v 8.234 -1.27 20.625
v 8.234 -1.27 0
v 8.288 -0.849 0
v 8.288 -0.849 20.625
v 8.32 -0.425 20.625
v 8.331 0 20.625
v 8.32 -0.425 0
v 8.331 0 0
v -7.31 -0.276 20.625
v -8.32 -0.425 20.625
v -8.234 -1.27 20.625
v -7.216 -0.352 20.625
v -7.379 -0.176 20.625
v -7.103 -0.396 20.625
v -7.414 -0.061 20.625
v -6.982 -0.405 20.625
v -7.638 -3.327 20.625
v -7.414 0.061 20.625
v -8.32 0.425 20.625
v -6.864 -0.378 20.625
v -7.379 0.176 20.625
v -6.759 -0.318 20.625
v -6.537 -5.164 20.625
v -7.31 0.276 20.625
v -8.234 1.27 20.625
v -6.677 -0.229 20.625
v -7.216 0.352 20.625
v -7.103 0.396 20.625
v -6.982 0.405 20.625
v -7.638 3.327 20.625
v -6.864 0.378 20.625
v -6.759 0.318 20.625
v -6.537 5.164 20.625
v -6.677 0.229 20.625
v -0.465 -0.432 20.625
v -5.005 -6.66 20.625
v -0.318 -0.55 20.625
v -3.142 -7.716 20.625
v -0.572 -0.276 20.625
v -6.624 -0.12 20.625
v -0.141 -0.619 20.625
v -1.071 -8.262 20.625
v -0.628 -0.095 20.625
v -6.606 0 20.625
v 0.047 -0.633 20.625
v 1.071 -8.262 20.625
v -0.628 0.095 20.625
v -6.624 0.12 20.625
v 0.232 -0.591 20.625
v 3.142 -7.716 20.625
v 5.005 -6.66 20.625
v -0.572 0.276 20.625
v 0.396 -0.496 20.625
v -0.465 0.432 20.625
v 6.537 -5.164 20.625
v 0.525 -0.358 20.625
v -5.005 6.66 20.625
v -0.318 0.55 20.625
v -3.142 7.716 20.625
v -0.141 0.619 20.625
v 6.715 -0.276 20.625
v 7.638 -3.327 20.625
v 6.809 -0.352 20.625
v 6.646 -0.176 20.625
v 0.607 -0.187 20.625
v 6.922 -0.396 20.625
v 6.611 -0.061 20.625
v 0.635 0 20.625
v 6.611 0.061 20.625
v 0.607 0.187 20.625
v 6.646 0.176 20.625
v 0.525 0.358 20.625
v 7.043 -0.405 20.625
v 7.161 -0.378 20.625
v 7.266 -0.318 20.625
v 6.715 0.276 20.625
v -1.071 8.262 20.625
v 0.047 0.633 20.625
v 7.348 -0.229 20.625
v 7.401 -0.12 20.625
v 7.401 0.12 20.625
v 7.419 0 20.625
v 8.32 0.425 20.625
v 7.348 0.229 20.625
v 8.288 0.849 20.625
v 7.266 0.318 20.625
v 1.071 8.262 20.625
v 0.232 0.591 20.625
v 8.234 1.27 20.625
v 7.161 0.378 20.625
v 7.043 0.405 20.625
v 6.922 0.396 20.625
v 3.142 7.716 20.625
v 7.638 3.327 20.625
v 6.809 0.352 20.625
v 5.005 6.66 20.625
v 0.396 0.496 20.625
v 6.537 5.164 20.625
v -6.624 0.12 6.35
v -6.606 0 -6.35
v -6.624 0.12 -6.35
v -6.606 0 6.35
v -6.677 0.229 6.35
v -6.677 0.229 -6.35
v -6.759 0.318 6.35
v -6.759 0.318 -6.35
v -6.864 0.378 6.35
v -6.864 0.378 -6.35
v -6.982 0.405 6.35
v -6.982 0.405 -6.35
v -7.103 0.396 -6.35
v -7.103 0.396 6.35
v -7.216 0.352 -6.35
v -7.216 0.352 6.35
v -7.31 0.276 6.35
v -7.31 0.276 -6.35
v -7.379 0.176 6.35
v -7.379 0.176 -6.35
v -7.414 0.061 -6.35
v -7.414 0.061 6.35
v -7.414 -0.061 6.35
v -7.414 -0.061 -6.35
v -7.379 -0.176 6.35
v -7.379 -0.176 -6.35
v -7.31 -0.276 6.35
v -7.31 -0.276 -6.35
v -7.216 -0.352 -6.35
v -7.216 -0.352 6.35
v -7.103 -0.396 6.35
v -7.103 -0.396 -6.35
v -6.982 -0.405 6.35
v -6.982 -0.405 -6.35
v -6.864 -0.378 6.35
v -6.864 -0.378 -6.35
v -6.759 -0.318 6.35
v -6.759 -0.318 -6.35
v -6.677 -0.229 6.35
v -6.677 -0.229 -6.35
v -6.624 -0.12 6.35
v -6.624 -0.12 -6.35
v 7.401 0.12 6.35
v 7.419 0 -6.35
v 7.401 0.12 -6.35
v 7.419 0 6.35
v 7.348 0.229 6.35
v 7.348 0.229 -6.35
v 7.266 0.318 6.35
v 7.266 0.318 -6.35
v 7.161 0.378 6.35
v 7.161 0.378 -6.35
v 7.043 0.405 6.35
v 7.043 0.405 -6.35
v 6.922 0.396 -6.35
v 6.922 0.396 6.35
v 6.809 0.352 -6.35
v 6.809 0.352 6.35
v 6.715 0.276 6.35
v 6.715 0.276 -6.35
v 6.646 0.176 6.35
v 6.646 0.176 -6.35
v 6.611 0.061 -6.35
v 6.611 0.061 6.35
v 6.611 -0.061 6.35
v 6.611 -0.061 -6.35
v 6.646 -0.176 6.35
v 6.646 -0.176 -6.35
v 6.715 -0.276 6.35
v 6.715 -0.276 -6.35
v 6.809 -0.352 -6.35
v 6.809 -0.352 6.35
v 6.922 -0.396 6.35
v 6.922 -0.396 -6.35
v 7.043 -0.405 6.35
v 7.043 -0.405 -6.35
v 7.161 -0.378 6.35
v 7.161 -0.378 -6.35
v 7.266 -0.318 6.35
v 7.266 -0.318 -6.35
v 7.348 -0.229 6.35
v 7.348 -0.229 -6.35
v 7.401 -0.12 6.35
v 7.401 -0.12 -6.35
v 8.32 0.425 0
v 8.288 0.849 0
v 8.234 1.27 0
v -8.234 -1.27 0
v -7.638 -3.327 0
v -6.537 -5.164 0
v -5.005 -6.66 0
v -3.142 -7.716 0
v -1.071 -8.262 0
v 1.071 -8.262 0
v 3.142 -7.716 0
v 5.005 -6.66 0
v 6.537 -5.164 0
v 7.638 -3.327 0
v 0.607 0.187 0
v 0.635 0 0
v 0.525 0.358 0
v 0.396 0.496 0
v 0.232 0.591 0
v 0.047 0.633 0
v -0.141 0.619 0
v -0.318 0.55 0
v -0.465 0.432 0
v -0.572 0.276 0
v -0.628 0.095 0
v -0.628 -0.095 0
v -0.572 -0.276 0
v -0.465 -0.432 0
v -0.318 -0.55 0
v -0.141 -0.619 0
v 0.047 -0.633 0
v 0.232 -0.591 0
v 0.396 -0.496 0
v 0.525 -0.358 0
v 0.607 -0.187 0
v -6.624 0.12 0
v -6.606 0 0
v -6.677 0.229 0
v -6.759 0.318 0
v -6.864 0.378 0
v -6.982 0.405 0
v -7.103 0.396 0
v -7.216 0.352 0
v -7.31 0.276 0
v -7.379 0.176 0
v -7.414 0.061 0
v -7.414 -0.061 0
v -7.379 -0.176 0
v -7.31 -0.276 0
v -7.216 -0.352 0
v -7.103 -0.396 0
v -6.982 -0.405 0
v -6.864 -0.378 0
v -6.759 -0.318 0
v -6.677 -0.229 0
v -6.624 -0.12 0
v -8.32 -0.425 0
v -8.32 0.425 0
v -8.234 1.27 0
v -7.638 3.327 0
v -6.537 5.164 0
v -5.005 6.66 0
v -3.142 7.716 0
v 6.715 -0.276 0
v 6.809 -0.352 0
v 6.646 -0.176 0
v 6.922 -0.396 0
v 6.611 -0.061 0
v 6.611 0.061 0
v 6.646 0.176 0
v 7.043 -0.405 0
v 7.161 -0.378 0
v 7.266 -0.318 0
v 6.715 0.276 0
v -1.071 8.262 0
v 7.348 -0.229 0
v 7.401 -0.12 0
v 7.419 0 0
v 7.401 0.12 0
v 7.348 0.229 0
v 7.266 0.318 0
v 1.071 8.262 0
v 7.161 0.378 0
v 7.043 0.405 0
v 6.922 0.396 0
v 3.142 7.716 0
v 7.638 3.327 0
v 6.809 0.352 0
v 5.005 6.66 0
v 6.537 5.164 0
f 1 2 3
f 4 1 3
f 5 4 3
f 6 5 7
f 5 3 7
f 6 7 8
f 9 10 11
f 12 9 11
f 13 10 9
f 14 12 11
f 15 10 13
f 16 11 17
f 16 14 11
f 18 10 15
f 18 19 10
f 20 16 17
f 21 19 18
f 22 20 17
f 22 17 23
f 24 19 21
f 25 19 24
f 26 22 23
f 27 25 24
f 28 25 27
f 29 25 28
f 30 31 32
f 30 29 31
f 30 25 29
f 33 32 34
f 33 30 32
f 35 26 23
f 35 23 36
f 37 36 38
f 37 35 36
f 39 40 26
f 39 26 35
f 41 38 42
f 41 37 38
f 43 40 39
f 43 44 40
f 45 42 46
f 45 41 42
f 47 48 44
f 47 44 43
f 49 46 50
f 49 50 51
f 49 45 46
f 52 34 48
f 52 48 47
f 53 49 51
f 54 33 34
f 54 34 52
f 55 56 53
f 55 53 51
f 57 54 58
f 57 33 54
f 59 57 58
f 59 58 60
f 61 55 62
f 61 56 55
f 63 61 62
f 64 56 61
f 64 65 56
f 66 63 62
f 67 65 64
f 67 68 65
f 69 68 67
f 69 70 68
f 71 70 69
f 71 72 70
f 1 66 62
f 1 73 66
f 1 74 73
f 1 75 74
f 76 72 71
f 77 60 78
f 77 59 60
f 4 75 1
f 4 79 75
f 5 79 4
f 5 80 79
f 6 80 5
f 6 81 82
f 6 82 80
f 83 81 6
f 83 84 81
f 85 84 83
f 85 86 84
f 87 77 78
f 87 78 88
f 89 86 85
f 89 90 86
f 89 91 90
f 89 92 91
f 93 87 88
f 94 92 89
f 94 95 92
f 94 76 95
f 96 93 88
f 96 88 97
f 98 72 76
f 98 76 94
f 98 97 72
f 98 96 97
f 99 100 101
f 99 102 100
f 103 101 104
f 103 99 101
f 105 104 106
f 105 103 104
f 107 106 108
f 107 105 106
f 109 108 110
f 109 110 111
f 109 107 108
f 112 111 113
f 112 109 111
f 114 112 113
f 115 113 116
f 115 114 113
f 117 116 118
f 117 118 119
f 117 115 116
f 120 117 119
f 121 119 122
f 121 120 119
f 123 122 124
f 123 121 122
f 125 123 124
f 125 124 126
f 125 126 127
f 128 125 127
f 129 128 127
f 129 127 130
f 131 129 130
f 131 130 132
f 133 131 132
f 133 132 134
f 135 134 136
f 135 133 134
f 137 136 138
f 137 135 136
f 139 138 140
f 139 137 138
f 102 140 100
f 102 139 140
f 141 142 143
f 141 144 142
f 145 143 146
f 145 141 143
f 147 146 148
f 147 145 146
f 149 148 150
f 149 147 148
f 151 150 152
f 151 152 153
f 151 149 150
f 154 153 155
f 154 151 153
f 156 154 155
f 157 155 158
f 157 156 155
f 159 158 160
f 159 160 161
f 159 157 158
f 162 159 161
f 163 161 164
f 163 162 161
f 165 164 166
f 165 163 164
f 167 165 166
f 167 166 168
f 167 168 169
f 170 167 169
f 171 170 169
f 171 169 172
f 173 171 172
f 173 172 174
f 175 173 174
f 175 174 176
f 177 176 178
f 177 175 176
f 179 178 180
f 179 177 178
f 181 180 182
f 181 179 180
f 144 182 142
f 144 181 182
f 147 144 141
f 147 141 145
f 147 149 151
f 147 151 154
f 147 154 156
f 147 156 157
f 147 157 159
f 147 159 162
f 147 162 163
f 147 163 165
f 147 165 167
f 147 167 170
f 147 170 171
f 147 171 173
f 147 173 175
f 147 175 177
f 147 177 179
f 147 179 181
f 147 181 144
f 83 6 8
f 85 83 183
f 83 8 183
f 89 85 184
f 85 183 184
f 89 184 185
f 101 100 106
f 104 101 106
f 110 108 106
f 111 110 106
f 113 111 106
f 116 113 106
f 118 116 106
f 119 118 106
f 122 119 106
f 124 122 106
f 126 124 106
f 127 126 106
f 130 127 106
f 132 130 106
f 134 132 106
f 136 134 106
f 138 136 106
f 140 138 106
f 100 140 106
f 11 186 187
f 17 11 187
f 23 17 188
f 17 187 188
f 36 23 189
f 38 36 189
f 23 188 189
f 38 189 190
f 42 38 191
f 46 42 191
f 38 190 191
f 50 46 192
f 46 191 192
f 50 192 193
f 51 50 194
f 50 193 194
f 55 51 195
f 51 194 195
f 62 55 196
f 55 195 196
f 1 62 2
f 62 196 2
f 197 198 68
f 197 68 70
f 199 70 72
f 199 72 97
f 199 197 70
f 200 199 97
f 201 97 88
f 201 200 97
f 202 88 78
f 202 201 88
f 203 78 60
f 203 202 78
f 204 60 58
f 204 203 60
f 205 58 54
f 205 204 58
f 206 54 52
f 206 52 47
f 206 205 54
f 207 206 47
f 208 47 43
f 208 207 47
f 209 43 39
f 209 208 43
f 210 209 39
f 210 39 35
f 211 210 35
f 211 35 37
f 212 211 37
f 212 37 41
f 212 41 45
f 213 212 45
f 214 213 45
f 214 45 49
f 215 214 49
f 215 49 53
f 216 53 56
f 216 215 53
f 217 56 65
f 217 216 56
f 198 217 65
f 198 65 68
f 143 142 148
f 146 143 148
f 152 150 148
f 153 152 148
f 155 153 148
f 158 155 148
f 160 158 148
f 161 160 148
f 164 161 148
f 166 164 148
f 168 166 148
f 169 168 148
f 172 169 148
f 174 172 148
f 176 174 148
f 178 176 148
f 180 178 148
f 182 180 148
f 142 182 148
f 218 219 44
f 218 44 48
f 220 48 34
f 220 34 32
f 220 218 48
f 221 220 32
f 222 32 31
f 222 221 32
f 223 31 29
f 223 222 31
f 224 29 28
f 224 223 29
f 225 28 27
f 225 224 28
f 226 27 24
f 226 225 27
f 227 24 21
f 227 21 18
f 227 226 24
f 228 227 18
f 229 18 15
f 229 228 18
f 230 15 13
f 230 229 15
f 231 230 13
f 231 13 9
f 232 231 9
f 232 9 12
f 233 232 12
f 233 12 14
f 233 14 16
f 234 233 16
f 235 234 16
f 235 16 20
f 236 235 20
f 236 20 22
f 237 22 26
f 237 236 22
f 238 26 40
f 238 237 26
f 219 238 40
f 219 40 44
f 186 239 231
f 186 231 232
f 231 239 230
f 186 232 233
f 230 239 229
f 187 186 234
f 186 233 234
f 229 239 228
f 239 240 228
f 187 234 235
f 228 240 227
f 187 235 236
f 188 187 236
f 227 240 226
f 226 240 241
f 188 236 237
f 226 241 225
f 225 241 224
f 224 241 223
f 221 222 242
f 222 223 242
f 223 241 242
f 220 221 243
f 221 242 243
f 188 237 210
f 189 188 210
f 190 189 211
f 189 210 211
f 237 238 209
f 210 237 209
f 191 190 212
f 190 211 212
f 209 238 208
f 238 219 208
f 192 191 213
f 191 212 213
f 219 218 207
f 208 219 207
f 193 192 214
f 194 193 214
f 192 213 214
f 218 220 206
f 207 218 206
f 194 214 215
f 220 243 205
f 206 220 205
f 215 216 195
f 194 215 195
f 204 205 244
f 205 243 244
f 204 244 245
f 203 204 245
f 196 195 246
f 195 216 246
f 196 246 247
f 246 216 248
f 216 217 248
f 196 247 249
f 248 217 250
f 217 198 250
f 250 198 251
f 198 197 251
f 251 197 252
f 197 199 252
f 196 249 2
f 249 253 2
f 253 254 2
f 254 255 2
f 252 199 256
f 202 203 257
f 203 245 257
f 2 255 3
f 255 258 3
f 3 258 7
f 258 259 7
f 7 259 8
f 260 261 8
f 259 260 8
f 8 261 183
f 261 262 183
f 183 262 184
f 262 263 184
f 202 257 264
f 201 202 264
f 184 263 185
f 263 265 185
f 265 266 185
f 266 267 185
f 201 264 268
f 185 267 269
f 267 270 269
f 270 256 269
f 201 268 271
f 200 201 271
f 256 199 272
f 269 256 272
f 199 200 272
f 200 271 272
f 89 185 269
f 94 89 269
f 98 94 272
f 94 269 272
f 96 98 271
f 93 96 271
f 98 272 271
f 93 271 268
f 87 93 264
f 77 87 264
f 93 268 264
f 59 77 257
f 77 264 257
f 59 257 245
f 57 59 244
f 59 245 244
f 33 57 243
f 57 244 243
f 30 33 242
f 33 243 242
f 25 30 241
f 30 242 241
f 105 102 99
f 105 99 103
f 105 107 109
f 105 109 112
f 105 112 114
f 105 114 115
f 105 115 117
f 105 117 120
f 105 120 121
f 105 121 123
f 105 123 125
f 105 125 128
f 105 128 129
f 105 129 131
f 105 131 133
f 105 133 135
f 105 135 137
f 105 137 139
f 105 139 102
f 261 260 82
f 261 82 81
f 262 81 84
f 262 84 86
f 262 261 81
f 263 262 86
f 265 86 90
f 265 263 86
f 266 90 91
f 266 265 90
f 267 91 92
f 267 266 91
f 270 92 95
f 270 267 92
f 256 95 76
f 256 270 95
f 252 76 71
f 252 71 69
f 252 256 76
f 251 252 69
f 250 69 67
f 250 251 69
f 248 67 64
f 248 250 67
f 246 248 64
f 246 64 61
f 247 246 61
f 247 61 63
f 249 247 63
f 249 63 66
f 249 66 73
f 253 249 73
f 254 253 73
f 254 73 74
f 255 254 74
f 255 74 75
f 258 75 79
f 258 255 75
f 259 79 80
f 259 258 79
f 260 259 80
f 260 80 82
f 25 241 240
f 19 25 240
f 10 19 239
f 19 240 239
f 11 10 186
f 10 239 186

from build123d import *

# Parameters (mm, degrees)
F0_R          = 0.635
F0_R_2        = 0.4064
F1_DEPTH      = 20.6248
F2_DEPTH      = 6.35
F2_DEPTH_BACK = 6.35


with BuildPart() as f1:
    # F0 (on Top) → F1 (new body)
    with BuildSketch(Plane.XY):
        with BuildLine():
            Line((5.6938322451, 1.27), (8.2338322451, 1.27))
            ThreePointArc((8.2338322451, 1.27), (0, 8.3312), (-8.2338322451, 1.27))
            Line((-8.2338322451, 1.27), (-5.6938322451, 1.27))
            Line((-5.6938322451, 1.27), (-5.6938322451, -1.27))
            Line((-5.6938322451, -1.27), (-8.2338322451, -1.27))
            ThreePointArc((-8.2338322451, -1.27), (0, -8.3312), (8.2338322451, -1.27))
            Line((8.2338322451, -1.27), (5.6938322451, -1.27))
            Line((5.6938322451, -1.27), (5.6938322451, 1.27))
        make_face()
        Circle(F0_R, mode=Mode.SUBTRACT)
        with BuildLine():
            Line((-5.6938322451, 1.27), (-8.2338322451, 1.27))
            ThreePointArc((-8.2338322451, 1.27), (-8.3312, 0), (-8.2338322451, -1.27))
            Line((-8.2338322451, -1.27), (-5.6938322451, -1.27))
            Line((-5.6938322451, -1.27), (-5.6938322451, 1.27))
        make_face()
        with Locations((-7.0125161225, 0)):
            Circle(F0_R_2, mode=Mode.SUBTRACT)
        with BuildLine():
            ThreePointArc((8.2338322451, -1.27), (8.3068223961, -0.6368635018), (8.3312, 0))
            ThreePointArc((8.3312, 0), (8.3068223961, 0.6368635018), (8.2338322451, 1.27))
            Line((8.2338322451, 1.27), (5.6938322451, 1.27))
            Line((5.6938322451, 1.27), (5.6938322451, -1.27))
            Line((5.6938322451, -1.27), (8.2338322451, -1.27))
        make_face()
        with Locations((7.0125161225, 0)):
            Circle(F0_R_2, mode=Mode.SUBTRACT)
    extrude(amount=F1_DEPTH)


with BuildPart() as f2:
    # F0 (on Top) → F2 (new body, two sides)
    with BuildSketch(Plane.XY) as f2_sk:
        with Locations((-7.0125161225, 0)):
            Circle(F0_R_2)
    extrude(amount=F2_DEPTH)
    extrude(f2_sk.sketch, amount=-F2_DEPTH_BACK)


with BuildPart() as f2b:
    # F0 (on Top) → F2, piece 2 (new body, two sides)
    with BuildSketch(Plane.XY) as f2_2_sk:
        with Locations((7.0125161225, 0)):
            Circle(F0_R_2)
    extrude(amount=F2_DEPTH)
    extrude(f2_2_sk.sketch, amount=-F2_DEPTH_BACK)


solid = Compound([f1.part, f2.part, f2b.part])
